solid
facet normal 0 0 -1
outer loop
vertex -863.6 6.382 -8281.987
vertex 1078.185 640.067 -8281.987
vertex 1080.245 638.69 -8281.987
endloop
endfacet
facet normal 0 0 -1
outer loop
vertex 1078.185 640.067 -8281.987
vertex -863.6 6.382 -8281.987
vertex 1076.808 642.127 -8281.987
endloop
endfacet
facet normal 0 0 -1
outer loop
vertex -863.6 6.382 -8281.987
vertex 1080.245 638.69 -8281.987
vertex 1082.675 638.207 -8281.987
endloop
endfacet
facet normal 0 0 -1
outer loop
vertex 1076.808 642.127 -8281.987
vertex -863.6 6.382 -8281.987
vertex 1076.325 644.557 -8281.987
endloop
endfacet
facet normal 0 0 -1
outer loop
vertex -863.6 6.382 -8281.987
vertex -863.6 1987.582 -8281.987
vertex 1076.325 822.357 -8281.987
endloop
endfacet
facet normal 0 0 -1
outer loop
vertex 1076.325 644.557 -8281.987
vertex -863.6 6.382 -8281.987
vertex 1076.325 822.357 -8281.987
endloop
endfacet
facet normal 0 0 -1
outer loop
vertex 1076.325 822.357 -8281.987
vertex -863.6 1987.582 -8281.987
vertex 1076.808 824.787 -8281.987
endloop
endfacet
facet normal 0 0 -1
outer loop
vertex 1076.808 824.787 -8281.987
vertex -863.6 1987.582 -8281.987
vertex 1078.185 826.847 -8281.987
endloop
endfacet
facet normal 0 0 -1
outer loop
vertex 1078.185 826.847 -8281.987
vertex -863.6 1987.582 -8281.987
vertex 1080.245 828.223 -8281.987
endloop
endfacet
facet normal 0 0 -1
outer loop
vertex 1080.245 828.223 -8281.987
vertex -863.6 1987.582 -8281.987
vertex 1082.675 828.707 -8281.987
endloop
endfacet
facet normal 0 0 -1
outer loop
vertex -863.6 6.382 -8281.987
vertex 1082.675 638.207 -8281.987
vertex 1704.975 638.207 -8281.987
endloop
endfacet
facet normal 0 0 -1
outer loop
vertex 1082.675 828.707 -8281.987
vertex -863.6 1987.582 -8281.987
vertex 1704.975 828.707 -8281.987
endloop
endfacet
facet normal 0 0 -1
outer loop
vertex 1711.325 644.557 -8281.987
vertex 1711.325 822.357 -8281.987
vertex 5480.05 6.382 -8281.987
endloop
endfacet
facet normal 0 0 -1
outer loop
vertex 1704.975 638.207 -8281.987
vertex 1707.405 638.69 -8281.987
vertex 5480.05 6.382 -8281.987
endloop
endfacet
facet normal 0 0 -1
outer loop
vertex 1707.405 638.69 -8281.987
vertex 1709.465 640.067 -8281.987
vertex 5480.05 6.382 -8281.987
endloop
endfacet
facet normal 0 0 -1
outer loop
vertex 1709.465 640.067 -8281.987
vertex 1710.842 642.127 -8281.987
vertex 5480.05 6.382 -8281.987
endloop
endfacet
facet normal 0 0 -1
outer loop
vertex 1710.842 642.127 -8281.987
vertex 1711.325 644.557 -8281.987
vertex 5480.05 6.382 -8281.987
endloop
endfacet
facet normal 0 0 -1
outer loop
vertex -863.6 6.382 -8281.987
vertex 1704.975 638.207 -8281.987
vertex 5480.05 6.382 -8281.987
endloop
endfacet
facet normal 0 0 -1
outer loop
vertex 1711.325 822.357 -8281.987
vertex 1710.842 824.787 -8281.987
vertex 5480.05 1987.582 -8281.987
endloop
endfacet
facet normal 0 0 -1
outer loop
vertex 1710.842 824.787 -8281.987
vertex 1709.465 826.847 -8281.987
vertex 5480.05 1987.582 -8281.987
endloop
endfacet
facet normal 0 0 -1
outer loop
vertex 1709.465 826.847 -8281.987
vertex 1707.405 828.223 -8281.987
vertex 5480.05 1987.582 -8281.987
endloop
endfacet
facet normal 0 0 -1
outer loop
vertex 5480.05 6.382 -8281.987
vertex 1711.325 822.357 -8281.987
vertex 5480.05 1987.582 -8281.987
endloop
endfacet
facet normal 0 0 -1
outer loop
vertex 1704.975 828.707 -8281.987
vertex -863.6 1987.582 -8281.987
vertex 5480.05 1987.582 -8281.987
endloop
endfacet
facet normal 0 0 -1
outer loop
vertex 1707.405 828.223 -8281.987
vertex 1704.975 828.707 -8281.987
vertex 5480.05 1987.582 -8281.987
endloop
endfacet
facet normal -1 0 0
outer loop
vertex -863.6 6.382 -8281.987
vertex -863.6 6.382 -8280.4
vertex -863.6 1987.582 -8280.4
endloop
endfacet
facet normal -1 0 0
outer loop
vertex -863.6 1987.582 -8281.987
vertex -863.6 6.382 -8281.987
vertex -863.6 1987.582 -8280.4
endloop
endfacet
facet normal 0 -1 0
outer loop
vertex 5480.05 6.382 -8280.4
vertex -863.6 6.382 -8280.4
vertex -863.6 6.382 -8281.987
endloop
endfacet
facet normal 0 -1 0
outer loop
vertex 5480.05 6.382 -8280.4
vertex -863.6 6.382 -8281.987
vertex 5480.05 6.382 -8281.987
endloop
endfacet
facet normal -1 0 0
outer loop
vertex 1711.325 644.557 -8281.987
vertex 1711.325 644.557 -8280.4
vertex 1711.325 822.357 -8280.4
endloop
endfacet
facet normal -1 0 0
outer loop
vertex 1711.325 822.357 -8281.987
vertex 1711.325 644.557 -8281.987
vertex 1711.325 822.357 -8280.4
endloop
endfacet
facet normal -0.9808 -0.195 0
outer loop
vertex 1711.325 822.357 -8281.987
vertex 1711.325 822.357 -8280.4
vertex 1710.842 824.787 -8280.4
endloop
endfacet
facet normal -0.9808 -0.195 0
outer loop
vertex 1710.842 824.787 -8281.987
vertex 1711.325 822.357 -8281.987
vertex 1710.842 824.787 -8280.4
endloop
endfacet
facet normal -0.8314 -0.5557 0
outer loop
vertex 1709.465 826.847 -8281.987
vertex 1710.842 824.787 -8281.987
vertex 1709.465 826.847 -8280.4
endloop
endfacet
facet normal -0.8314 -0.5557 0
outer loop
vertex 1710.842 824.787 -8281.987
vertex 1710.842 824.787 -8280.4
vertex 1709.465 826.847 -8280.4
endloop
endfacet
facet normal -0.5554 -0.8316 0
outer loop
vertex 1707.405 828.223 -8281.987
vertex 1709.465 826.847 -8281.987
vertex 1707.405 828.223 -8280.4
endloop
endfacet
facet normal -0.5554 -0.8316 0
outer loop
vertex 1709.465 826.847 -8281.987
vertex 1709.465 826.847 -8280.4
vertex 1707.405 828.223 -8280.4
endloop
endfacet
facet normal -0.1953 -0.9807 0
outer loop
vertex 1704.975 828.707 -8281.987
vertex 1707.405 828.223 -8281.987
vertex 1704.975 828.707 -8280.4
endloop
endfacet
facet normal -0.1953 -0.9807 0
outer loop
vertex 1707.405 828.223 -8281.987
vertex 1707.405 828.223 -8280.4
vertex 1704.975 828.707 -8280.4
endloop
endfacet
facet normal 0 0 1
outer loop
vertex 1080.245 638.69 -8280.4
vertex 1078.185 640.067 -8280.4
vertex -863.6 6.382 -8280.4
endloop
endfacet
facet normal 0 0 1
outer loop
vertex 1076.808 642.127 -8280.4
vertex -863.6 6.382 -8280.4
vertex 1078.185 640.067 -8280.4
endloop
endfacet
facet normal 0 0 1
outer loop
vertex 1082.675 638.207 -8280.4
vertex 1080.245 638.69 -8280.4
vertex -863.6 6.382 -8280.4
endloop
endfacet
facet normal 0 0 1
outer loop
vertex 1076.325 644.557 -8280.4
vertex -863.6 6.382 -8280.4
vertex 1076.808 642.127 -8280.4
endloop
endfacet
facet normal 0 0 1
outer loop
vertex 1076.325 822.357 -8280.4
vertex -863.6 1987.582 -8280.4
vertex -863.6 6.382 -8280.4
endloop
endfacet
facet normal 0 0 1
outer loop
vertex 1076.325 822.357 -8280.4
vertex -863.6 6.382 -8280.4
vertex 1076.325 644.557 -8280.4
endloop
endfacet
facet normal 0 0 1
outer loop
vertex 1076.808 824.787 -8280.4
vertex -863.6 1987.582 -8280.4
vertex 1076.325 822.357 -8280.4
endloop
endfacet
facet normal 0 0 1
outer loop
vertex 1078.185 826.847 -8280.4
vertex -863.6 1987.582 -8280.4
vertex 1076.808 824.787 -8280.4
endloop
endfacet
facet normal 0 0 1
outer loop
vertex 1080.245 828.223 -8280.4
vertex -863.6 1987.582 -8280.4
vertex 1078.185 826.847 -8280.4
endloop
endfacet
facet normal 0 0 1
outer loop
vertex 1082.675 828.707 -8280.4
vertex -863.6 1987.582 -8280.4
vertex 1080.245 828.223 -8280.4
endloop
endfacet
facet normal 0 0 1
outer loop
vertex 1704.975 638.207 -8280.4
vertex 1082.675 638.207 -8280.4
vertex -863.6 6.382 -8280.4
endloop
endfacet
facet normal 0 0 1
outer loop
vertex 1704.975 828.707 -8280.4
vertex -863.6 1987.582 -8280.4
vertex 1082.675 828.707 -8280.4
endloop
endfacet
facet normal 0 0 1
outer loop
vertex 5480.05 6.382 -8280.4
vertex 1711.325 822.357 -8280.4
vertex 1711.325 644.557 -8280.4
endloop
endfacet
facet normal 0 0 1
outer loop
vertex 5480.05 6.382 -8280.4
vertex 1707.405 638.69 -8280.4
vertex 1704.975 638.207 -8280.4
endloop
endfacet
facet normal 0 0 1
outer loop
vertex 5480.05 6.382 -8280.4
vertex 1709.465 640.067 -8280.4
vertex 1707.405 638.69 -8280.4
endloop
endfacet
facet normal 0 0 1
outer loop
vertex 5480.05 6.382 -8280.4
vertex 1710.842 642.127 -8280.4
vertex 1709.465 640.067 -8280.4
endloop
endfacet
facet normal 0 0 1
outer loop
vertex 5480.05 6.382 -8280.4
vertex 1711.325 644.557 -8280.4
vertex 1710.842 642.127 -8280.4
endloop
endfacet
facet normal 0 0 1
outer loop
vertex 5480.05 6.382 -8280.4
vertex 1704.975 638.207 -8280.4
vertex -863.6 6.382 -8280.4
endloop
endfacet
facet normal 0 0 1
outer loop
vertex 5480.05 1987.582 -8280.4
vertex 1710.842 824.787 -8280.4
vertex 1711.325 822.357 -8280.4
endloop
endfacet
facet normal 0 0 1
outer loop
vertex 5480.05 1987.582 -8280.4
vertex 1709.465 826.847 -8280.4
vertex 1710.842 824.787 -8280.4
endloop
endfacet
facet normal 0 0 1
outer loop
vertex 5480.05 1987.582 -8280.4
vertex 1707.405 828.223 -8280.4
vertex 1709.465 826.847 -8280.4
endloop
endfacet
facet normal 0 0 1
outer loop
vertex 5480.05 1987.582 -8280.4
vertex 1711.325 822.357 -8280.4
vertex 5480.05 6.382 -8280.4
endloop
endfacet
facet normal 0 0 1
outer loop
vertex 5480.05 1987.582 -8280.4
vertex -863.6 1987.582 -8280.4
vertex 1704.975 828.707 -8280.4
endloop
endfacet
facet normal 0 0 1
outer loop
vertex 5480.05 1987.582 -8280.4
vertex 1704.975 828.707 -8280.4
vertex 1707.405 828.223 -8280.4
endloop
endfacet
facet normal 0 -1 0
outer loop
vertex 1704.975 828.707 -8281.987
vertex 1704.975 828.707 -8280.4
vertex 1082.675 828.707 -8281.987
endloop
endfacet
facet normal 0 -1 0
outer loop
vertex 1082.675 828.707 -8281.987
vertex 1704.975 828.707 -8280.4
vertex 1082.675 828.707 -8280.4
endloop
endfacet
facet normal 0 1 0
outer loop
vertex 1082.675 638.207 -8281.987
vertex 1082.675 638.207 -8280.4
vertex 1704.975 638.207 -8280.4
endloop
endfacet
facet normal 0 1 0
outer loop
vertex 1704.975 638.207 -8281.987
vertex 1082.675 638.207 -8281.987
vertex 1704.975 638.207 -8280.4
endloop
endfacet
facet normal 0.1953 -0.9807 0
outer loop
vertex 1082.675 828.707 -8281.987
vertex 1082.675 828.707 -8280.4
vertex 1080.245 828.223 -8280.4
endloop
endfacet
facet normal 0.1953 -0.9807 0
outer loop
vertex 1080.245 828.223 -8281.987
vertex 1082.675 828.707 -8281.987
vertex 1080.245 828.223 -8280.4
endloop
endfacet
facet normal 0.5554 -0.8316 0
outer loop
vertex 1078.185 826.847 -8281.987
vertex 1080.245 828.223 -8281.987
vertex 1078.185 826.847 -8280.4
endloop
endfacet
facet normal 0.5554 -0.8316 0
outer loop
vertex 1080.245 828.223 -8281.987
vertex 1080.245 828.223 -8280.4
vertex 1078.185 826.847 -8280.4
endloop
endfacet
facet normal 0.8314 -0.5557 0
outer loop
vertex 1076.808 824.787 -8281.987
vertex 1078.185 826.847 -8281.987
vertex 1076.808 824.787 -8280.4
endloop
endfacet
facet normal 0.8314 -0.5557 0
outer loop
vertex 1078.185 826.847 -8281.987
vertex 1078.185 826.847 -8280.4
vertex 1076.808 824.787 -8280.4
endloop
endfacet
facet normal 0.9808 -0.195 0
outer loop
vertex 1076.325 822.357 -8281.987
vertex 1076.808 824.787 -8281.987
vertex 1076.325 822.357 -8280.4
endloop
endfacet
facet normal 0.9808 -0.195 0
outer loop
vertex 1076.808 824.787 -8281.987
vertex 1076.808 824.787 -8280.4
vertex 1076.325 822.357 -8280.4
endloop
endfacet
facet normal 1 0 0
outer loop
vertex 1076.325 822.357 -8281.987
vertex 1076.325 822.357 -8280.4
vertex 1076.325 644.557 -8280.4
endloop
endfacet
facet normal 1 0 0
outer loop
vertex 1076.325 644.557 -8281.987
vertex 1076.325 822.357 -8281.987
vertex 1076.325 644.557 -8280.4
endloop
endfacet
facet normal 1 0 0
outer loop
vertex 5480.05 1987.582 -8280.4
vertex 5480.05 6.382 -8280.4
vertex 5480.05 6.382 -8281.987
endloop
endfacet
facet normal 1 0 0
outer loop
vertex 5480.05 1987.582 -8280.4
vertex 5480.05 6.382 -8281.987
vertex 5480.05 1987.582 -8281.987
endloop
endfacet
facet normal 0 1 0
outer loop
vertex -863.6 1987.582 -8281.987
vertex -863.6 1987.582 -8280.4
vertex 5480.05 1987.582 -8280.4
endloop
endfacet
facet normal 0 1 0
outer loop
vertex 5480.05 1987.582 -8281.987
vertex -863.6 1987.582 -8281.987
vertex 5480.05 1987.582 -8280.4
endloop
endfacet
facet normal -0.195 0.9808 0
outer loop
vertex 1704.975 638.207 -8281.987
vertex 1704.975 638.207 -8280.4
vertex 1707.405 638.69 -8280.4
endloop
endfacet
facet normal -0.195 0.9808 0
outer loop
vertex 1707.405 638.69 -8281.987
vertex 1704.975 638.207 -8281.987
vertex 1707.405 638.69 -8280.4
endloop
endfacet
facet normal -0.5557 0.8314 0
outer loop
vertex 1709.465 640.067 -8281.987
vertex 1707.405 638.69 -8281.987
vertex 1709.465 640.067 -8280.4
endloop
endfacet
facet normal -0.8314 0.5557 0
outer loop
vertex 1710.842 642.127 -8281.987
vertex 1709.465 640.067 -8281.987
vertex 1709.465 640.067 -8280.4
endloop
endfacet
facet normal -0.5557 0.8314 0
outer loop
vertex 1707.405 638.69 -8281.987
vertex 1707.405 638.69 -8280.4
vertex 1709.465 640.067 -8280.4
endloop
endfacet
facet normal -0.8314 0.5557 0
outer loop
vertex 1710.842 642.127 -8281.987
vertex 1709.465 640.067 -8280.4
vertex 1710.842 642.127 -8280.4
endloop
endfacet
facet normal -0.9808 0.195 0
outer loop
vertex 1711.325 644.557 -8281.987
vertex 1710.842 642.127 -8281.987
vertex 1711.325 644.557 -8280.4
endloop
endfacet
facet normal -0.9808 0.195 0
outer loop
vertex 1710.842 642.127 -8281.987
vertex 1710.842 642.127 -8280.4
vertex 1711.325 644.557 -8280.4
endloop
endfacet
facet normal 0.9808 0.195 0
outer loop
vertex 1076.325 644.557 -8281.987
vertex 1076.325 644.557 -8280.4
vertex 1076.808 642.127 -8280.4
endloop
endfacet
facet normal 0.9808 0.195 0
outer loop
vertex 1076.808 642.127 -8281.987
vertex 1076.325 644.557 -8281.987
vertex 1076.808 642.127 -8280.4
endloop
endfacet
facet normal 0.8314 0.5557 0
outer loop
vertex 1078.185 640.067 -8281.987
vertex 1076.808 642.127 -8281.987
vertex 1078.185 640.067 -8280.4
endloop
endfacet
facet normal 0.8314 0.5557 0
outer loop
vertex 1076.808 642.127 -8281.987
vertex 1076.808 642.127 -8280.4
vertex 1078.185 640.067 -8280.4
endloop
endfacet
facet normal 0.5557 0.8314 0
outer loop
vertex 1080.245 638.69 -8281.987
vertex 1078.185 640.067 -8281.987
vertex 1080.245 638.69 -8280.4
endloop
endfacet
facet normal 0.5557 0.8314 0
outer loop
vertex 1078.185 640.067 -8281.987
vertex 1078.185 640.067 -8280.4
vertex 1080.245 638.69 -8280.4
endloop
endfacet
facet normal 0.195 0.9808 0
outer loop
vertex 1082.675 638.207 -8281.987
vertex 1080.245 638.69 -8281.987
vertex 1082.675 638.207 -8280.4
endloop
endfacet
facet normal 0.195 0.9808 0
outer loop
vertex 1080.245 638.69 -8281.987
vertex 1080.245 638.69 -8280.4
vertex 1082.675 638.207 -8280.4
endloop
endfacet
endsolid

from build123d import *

# Parameters (mm, degrees)
SKETCH2_W           = 6343.65
SKETCH2_H           = 1981.2
BOSS_EXTRUDE1_DEPTH = 1.5875


with BuildPart() as part:
    # Sketch2 → Boss-Extrude1 (new body)
    with BuildSketch(Plane.XY.offset(-8280.4)):
        with Locations((2308.225, 996.98175)):
            Rectangle(SKETCH2_W, SKETCH2_H)
        with BuildLine():
            Line((1711.325, 644.55675), (1711.325, 822.35675))
            ThreePointArc((1711.325, 822.35675), (1709.465128061, 826.846878061), (1704.975, 828.70675))
            Line((1704.975, 828.70675), (1082.675, 828.70675))
            ThreePointArc((1082.675, 828.70675), (1078.184871939, 826.846878061), (1076.325, 822.35675))
            Line((1076.325, 822.35675), (1076.325, 644.55675))
            ThreePointArc((1076.325, 644.55675), (1078.184871939, 640.066621939), (1082.675, 638.20675))
            Line((1082.675, 638.20675), (1704.975, 638.20675))
            ThreePointArc((1704.975, 638.20675), (1709.465128061, 640.066621939), (1711.325, 644.55675))
        make_face(mode=Mode.SUBTRACT)
    extrude(amount=-BOSS_EXTRUDE1_DEPTH)


solid = part.part
